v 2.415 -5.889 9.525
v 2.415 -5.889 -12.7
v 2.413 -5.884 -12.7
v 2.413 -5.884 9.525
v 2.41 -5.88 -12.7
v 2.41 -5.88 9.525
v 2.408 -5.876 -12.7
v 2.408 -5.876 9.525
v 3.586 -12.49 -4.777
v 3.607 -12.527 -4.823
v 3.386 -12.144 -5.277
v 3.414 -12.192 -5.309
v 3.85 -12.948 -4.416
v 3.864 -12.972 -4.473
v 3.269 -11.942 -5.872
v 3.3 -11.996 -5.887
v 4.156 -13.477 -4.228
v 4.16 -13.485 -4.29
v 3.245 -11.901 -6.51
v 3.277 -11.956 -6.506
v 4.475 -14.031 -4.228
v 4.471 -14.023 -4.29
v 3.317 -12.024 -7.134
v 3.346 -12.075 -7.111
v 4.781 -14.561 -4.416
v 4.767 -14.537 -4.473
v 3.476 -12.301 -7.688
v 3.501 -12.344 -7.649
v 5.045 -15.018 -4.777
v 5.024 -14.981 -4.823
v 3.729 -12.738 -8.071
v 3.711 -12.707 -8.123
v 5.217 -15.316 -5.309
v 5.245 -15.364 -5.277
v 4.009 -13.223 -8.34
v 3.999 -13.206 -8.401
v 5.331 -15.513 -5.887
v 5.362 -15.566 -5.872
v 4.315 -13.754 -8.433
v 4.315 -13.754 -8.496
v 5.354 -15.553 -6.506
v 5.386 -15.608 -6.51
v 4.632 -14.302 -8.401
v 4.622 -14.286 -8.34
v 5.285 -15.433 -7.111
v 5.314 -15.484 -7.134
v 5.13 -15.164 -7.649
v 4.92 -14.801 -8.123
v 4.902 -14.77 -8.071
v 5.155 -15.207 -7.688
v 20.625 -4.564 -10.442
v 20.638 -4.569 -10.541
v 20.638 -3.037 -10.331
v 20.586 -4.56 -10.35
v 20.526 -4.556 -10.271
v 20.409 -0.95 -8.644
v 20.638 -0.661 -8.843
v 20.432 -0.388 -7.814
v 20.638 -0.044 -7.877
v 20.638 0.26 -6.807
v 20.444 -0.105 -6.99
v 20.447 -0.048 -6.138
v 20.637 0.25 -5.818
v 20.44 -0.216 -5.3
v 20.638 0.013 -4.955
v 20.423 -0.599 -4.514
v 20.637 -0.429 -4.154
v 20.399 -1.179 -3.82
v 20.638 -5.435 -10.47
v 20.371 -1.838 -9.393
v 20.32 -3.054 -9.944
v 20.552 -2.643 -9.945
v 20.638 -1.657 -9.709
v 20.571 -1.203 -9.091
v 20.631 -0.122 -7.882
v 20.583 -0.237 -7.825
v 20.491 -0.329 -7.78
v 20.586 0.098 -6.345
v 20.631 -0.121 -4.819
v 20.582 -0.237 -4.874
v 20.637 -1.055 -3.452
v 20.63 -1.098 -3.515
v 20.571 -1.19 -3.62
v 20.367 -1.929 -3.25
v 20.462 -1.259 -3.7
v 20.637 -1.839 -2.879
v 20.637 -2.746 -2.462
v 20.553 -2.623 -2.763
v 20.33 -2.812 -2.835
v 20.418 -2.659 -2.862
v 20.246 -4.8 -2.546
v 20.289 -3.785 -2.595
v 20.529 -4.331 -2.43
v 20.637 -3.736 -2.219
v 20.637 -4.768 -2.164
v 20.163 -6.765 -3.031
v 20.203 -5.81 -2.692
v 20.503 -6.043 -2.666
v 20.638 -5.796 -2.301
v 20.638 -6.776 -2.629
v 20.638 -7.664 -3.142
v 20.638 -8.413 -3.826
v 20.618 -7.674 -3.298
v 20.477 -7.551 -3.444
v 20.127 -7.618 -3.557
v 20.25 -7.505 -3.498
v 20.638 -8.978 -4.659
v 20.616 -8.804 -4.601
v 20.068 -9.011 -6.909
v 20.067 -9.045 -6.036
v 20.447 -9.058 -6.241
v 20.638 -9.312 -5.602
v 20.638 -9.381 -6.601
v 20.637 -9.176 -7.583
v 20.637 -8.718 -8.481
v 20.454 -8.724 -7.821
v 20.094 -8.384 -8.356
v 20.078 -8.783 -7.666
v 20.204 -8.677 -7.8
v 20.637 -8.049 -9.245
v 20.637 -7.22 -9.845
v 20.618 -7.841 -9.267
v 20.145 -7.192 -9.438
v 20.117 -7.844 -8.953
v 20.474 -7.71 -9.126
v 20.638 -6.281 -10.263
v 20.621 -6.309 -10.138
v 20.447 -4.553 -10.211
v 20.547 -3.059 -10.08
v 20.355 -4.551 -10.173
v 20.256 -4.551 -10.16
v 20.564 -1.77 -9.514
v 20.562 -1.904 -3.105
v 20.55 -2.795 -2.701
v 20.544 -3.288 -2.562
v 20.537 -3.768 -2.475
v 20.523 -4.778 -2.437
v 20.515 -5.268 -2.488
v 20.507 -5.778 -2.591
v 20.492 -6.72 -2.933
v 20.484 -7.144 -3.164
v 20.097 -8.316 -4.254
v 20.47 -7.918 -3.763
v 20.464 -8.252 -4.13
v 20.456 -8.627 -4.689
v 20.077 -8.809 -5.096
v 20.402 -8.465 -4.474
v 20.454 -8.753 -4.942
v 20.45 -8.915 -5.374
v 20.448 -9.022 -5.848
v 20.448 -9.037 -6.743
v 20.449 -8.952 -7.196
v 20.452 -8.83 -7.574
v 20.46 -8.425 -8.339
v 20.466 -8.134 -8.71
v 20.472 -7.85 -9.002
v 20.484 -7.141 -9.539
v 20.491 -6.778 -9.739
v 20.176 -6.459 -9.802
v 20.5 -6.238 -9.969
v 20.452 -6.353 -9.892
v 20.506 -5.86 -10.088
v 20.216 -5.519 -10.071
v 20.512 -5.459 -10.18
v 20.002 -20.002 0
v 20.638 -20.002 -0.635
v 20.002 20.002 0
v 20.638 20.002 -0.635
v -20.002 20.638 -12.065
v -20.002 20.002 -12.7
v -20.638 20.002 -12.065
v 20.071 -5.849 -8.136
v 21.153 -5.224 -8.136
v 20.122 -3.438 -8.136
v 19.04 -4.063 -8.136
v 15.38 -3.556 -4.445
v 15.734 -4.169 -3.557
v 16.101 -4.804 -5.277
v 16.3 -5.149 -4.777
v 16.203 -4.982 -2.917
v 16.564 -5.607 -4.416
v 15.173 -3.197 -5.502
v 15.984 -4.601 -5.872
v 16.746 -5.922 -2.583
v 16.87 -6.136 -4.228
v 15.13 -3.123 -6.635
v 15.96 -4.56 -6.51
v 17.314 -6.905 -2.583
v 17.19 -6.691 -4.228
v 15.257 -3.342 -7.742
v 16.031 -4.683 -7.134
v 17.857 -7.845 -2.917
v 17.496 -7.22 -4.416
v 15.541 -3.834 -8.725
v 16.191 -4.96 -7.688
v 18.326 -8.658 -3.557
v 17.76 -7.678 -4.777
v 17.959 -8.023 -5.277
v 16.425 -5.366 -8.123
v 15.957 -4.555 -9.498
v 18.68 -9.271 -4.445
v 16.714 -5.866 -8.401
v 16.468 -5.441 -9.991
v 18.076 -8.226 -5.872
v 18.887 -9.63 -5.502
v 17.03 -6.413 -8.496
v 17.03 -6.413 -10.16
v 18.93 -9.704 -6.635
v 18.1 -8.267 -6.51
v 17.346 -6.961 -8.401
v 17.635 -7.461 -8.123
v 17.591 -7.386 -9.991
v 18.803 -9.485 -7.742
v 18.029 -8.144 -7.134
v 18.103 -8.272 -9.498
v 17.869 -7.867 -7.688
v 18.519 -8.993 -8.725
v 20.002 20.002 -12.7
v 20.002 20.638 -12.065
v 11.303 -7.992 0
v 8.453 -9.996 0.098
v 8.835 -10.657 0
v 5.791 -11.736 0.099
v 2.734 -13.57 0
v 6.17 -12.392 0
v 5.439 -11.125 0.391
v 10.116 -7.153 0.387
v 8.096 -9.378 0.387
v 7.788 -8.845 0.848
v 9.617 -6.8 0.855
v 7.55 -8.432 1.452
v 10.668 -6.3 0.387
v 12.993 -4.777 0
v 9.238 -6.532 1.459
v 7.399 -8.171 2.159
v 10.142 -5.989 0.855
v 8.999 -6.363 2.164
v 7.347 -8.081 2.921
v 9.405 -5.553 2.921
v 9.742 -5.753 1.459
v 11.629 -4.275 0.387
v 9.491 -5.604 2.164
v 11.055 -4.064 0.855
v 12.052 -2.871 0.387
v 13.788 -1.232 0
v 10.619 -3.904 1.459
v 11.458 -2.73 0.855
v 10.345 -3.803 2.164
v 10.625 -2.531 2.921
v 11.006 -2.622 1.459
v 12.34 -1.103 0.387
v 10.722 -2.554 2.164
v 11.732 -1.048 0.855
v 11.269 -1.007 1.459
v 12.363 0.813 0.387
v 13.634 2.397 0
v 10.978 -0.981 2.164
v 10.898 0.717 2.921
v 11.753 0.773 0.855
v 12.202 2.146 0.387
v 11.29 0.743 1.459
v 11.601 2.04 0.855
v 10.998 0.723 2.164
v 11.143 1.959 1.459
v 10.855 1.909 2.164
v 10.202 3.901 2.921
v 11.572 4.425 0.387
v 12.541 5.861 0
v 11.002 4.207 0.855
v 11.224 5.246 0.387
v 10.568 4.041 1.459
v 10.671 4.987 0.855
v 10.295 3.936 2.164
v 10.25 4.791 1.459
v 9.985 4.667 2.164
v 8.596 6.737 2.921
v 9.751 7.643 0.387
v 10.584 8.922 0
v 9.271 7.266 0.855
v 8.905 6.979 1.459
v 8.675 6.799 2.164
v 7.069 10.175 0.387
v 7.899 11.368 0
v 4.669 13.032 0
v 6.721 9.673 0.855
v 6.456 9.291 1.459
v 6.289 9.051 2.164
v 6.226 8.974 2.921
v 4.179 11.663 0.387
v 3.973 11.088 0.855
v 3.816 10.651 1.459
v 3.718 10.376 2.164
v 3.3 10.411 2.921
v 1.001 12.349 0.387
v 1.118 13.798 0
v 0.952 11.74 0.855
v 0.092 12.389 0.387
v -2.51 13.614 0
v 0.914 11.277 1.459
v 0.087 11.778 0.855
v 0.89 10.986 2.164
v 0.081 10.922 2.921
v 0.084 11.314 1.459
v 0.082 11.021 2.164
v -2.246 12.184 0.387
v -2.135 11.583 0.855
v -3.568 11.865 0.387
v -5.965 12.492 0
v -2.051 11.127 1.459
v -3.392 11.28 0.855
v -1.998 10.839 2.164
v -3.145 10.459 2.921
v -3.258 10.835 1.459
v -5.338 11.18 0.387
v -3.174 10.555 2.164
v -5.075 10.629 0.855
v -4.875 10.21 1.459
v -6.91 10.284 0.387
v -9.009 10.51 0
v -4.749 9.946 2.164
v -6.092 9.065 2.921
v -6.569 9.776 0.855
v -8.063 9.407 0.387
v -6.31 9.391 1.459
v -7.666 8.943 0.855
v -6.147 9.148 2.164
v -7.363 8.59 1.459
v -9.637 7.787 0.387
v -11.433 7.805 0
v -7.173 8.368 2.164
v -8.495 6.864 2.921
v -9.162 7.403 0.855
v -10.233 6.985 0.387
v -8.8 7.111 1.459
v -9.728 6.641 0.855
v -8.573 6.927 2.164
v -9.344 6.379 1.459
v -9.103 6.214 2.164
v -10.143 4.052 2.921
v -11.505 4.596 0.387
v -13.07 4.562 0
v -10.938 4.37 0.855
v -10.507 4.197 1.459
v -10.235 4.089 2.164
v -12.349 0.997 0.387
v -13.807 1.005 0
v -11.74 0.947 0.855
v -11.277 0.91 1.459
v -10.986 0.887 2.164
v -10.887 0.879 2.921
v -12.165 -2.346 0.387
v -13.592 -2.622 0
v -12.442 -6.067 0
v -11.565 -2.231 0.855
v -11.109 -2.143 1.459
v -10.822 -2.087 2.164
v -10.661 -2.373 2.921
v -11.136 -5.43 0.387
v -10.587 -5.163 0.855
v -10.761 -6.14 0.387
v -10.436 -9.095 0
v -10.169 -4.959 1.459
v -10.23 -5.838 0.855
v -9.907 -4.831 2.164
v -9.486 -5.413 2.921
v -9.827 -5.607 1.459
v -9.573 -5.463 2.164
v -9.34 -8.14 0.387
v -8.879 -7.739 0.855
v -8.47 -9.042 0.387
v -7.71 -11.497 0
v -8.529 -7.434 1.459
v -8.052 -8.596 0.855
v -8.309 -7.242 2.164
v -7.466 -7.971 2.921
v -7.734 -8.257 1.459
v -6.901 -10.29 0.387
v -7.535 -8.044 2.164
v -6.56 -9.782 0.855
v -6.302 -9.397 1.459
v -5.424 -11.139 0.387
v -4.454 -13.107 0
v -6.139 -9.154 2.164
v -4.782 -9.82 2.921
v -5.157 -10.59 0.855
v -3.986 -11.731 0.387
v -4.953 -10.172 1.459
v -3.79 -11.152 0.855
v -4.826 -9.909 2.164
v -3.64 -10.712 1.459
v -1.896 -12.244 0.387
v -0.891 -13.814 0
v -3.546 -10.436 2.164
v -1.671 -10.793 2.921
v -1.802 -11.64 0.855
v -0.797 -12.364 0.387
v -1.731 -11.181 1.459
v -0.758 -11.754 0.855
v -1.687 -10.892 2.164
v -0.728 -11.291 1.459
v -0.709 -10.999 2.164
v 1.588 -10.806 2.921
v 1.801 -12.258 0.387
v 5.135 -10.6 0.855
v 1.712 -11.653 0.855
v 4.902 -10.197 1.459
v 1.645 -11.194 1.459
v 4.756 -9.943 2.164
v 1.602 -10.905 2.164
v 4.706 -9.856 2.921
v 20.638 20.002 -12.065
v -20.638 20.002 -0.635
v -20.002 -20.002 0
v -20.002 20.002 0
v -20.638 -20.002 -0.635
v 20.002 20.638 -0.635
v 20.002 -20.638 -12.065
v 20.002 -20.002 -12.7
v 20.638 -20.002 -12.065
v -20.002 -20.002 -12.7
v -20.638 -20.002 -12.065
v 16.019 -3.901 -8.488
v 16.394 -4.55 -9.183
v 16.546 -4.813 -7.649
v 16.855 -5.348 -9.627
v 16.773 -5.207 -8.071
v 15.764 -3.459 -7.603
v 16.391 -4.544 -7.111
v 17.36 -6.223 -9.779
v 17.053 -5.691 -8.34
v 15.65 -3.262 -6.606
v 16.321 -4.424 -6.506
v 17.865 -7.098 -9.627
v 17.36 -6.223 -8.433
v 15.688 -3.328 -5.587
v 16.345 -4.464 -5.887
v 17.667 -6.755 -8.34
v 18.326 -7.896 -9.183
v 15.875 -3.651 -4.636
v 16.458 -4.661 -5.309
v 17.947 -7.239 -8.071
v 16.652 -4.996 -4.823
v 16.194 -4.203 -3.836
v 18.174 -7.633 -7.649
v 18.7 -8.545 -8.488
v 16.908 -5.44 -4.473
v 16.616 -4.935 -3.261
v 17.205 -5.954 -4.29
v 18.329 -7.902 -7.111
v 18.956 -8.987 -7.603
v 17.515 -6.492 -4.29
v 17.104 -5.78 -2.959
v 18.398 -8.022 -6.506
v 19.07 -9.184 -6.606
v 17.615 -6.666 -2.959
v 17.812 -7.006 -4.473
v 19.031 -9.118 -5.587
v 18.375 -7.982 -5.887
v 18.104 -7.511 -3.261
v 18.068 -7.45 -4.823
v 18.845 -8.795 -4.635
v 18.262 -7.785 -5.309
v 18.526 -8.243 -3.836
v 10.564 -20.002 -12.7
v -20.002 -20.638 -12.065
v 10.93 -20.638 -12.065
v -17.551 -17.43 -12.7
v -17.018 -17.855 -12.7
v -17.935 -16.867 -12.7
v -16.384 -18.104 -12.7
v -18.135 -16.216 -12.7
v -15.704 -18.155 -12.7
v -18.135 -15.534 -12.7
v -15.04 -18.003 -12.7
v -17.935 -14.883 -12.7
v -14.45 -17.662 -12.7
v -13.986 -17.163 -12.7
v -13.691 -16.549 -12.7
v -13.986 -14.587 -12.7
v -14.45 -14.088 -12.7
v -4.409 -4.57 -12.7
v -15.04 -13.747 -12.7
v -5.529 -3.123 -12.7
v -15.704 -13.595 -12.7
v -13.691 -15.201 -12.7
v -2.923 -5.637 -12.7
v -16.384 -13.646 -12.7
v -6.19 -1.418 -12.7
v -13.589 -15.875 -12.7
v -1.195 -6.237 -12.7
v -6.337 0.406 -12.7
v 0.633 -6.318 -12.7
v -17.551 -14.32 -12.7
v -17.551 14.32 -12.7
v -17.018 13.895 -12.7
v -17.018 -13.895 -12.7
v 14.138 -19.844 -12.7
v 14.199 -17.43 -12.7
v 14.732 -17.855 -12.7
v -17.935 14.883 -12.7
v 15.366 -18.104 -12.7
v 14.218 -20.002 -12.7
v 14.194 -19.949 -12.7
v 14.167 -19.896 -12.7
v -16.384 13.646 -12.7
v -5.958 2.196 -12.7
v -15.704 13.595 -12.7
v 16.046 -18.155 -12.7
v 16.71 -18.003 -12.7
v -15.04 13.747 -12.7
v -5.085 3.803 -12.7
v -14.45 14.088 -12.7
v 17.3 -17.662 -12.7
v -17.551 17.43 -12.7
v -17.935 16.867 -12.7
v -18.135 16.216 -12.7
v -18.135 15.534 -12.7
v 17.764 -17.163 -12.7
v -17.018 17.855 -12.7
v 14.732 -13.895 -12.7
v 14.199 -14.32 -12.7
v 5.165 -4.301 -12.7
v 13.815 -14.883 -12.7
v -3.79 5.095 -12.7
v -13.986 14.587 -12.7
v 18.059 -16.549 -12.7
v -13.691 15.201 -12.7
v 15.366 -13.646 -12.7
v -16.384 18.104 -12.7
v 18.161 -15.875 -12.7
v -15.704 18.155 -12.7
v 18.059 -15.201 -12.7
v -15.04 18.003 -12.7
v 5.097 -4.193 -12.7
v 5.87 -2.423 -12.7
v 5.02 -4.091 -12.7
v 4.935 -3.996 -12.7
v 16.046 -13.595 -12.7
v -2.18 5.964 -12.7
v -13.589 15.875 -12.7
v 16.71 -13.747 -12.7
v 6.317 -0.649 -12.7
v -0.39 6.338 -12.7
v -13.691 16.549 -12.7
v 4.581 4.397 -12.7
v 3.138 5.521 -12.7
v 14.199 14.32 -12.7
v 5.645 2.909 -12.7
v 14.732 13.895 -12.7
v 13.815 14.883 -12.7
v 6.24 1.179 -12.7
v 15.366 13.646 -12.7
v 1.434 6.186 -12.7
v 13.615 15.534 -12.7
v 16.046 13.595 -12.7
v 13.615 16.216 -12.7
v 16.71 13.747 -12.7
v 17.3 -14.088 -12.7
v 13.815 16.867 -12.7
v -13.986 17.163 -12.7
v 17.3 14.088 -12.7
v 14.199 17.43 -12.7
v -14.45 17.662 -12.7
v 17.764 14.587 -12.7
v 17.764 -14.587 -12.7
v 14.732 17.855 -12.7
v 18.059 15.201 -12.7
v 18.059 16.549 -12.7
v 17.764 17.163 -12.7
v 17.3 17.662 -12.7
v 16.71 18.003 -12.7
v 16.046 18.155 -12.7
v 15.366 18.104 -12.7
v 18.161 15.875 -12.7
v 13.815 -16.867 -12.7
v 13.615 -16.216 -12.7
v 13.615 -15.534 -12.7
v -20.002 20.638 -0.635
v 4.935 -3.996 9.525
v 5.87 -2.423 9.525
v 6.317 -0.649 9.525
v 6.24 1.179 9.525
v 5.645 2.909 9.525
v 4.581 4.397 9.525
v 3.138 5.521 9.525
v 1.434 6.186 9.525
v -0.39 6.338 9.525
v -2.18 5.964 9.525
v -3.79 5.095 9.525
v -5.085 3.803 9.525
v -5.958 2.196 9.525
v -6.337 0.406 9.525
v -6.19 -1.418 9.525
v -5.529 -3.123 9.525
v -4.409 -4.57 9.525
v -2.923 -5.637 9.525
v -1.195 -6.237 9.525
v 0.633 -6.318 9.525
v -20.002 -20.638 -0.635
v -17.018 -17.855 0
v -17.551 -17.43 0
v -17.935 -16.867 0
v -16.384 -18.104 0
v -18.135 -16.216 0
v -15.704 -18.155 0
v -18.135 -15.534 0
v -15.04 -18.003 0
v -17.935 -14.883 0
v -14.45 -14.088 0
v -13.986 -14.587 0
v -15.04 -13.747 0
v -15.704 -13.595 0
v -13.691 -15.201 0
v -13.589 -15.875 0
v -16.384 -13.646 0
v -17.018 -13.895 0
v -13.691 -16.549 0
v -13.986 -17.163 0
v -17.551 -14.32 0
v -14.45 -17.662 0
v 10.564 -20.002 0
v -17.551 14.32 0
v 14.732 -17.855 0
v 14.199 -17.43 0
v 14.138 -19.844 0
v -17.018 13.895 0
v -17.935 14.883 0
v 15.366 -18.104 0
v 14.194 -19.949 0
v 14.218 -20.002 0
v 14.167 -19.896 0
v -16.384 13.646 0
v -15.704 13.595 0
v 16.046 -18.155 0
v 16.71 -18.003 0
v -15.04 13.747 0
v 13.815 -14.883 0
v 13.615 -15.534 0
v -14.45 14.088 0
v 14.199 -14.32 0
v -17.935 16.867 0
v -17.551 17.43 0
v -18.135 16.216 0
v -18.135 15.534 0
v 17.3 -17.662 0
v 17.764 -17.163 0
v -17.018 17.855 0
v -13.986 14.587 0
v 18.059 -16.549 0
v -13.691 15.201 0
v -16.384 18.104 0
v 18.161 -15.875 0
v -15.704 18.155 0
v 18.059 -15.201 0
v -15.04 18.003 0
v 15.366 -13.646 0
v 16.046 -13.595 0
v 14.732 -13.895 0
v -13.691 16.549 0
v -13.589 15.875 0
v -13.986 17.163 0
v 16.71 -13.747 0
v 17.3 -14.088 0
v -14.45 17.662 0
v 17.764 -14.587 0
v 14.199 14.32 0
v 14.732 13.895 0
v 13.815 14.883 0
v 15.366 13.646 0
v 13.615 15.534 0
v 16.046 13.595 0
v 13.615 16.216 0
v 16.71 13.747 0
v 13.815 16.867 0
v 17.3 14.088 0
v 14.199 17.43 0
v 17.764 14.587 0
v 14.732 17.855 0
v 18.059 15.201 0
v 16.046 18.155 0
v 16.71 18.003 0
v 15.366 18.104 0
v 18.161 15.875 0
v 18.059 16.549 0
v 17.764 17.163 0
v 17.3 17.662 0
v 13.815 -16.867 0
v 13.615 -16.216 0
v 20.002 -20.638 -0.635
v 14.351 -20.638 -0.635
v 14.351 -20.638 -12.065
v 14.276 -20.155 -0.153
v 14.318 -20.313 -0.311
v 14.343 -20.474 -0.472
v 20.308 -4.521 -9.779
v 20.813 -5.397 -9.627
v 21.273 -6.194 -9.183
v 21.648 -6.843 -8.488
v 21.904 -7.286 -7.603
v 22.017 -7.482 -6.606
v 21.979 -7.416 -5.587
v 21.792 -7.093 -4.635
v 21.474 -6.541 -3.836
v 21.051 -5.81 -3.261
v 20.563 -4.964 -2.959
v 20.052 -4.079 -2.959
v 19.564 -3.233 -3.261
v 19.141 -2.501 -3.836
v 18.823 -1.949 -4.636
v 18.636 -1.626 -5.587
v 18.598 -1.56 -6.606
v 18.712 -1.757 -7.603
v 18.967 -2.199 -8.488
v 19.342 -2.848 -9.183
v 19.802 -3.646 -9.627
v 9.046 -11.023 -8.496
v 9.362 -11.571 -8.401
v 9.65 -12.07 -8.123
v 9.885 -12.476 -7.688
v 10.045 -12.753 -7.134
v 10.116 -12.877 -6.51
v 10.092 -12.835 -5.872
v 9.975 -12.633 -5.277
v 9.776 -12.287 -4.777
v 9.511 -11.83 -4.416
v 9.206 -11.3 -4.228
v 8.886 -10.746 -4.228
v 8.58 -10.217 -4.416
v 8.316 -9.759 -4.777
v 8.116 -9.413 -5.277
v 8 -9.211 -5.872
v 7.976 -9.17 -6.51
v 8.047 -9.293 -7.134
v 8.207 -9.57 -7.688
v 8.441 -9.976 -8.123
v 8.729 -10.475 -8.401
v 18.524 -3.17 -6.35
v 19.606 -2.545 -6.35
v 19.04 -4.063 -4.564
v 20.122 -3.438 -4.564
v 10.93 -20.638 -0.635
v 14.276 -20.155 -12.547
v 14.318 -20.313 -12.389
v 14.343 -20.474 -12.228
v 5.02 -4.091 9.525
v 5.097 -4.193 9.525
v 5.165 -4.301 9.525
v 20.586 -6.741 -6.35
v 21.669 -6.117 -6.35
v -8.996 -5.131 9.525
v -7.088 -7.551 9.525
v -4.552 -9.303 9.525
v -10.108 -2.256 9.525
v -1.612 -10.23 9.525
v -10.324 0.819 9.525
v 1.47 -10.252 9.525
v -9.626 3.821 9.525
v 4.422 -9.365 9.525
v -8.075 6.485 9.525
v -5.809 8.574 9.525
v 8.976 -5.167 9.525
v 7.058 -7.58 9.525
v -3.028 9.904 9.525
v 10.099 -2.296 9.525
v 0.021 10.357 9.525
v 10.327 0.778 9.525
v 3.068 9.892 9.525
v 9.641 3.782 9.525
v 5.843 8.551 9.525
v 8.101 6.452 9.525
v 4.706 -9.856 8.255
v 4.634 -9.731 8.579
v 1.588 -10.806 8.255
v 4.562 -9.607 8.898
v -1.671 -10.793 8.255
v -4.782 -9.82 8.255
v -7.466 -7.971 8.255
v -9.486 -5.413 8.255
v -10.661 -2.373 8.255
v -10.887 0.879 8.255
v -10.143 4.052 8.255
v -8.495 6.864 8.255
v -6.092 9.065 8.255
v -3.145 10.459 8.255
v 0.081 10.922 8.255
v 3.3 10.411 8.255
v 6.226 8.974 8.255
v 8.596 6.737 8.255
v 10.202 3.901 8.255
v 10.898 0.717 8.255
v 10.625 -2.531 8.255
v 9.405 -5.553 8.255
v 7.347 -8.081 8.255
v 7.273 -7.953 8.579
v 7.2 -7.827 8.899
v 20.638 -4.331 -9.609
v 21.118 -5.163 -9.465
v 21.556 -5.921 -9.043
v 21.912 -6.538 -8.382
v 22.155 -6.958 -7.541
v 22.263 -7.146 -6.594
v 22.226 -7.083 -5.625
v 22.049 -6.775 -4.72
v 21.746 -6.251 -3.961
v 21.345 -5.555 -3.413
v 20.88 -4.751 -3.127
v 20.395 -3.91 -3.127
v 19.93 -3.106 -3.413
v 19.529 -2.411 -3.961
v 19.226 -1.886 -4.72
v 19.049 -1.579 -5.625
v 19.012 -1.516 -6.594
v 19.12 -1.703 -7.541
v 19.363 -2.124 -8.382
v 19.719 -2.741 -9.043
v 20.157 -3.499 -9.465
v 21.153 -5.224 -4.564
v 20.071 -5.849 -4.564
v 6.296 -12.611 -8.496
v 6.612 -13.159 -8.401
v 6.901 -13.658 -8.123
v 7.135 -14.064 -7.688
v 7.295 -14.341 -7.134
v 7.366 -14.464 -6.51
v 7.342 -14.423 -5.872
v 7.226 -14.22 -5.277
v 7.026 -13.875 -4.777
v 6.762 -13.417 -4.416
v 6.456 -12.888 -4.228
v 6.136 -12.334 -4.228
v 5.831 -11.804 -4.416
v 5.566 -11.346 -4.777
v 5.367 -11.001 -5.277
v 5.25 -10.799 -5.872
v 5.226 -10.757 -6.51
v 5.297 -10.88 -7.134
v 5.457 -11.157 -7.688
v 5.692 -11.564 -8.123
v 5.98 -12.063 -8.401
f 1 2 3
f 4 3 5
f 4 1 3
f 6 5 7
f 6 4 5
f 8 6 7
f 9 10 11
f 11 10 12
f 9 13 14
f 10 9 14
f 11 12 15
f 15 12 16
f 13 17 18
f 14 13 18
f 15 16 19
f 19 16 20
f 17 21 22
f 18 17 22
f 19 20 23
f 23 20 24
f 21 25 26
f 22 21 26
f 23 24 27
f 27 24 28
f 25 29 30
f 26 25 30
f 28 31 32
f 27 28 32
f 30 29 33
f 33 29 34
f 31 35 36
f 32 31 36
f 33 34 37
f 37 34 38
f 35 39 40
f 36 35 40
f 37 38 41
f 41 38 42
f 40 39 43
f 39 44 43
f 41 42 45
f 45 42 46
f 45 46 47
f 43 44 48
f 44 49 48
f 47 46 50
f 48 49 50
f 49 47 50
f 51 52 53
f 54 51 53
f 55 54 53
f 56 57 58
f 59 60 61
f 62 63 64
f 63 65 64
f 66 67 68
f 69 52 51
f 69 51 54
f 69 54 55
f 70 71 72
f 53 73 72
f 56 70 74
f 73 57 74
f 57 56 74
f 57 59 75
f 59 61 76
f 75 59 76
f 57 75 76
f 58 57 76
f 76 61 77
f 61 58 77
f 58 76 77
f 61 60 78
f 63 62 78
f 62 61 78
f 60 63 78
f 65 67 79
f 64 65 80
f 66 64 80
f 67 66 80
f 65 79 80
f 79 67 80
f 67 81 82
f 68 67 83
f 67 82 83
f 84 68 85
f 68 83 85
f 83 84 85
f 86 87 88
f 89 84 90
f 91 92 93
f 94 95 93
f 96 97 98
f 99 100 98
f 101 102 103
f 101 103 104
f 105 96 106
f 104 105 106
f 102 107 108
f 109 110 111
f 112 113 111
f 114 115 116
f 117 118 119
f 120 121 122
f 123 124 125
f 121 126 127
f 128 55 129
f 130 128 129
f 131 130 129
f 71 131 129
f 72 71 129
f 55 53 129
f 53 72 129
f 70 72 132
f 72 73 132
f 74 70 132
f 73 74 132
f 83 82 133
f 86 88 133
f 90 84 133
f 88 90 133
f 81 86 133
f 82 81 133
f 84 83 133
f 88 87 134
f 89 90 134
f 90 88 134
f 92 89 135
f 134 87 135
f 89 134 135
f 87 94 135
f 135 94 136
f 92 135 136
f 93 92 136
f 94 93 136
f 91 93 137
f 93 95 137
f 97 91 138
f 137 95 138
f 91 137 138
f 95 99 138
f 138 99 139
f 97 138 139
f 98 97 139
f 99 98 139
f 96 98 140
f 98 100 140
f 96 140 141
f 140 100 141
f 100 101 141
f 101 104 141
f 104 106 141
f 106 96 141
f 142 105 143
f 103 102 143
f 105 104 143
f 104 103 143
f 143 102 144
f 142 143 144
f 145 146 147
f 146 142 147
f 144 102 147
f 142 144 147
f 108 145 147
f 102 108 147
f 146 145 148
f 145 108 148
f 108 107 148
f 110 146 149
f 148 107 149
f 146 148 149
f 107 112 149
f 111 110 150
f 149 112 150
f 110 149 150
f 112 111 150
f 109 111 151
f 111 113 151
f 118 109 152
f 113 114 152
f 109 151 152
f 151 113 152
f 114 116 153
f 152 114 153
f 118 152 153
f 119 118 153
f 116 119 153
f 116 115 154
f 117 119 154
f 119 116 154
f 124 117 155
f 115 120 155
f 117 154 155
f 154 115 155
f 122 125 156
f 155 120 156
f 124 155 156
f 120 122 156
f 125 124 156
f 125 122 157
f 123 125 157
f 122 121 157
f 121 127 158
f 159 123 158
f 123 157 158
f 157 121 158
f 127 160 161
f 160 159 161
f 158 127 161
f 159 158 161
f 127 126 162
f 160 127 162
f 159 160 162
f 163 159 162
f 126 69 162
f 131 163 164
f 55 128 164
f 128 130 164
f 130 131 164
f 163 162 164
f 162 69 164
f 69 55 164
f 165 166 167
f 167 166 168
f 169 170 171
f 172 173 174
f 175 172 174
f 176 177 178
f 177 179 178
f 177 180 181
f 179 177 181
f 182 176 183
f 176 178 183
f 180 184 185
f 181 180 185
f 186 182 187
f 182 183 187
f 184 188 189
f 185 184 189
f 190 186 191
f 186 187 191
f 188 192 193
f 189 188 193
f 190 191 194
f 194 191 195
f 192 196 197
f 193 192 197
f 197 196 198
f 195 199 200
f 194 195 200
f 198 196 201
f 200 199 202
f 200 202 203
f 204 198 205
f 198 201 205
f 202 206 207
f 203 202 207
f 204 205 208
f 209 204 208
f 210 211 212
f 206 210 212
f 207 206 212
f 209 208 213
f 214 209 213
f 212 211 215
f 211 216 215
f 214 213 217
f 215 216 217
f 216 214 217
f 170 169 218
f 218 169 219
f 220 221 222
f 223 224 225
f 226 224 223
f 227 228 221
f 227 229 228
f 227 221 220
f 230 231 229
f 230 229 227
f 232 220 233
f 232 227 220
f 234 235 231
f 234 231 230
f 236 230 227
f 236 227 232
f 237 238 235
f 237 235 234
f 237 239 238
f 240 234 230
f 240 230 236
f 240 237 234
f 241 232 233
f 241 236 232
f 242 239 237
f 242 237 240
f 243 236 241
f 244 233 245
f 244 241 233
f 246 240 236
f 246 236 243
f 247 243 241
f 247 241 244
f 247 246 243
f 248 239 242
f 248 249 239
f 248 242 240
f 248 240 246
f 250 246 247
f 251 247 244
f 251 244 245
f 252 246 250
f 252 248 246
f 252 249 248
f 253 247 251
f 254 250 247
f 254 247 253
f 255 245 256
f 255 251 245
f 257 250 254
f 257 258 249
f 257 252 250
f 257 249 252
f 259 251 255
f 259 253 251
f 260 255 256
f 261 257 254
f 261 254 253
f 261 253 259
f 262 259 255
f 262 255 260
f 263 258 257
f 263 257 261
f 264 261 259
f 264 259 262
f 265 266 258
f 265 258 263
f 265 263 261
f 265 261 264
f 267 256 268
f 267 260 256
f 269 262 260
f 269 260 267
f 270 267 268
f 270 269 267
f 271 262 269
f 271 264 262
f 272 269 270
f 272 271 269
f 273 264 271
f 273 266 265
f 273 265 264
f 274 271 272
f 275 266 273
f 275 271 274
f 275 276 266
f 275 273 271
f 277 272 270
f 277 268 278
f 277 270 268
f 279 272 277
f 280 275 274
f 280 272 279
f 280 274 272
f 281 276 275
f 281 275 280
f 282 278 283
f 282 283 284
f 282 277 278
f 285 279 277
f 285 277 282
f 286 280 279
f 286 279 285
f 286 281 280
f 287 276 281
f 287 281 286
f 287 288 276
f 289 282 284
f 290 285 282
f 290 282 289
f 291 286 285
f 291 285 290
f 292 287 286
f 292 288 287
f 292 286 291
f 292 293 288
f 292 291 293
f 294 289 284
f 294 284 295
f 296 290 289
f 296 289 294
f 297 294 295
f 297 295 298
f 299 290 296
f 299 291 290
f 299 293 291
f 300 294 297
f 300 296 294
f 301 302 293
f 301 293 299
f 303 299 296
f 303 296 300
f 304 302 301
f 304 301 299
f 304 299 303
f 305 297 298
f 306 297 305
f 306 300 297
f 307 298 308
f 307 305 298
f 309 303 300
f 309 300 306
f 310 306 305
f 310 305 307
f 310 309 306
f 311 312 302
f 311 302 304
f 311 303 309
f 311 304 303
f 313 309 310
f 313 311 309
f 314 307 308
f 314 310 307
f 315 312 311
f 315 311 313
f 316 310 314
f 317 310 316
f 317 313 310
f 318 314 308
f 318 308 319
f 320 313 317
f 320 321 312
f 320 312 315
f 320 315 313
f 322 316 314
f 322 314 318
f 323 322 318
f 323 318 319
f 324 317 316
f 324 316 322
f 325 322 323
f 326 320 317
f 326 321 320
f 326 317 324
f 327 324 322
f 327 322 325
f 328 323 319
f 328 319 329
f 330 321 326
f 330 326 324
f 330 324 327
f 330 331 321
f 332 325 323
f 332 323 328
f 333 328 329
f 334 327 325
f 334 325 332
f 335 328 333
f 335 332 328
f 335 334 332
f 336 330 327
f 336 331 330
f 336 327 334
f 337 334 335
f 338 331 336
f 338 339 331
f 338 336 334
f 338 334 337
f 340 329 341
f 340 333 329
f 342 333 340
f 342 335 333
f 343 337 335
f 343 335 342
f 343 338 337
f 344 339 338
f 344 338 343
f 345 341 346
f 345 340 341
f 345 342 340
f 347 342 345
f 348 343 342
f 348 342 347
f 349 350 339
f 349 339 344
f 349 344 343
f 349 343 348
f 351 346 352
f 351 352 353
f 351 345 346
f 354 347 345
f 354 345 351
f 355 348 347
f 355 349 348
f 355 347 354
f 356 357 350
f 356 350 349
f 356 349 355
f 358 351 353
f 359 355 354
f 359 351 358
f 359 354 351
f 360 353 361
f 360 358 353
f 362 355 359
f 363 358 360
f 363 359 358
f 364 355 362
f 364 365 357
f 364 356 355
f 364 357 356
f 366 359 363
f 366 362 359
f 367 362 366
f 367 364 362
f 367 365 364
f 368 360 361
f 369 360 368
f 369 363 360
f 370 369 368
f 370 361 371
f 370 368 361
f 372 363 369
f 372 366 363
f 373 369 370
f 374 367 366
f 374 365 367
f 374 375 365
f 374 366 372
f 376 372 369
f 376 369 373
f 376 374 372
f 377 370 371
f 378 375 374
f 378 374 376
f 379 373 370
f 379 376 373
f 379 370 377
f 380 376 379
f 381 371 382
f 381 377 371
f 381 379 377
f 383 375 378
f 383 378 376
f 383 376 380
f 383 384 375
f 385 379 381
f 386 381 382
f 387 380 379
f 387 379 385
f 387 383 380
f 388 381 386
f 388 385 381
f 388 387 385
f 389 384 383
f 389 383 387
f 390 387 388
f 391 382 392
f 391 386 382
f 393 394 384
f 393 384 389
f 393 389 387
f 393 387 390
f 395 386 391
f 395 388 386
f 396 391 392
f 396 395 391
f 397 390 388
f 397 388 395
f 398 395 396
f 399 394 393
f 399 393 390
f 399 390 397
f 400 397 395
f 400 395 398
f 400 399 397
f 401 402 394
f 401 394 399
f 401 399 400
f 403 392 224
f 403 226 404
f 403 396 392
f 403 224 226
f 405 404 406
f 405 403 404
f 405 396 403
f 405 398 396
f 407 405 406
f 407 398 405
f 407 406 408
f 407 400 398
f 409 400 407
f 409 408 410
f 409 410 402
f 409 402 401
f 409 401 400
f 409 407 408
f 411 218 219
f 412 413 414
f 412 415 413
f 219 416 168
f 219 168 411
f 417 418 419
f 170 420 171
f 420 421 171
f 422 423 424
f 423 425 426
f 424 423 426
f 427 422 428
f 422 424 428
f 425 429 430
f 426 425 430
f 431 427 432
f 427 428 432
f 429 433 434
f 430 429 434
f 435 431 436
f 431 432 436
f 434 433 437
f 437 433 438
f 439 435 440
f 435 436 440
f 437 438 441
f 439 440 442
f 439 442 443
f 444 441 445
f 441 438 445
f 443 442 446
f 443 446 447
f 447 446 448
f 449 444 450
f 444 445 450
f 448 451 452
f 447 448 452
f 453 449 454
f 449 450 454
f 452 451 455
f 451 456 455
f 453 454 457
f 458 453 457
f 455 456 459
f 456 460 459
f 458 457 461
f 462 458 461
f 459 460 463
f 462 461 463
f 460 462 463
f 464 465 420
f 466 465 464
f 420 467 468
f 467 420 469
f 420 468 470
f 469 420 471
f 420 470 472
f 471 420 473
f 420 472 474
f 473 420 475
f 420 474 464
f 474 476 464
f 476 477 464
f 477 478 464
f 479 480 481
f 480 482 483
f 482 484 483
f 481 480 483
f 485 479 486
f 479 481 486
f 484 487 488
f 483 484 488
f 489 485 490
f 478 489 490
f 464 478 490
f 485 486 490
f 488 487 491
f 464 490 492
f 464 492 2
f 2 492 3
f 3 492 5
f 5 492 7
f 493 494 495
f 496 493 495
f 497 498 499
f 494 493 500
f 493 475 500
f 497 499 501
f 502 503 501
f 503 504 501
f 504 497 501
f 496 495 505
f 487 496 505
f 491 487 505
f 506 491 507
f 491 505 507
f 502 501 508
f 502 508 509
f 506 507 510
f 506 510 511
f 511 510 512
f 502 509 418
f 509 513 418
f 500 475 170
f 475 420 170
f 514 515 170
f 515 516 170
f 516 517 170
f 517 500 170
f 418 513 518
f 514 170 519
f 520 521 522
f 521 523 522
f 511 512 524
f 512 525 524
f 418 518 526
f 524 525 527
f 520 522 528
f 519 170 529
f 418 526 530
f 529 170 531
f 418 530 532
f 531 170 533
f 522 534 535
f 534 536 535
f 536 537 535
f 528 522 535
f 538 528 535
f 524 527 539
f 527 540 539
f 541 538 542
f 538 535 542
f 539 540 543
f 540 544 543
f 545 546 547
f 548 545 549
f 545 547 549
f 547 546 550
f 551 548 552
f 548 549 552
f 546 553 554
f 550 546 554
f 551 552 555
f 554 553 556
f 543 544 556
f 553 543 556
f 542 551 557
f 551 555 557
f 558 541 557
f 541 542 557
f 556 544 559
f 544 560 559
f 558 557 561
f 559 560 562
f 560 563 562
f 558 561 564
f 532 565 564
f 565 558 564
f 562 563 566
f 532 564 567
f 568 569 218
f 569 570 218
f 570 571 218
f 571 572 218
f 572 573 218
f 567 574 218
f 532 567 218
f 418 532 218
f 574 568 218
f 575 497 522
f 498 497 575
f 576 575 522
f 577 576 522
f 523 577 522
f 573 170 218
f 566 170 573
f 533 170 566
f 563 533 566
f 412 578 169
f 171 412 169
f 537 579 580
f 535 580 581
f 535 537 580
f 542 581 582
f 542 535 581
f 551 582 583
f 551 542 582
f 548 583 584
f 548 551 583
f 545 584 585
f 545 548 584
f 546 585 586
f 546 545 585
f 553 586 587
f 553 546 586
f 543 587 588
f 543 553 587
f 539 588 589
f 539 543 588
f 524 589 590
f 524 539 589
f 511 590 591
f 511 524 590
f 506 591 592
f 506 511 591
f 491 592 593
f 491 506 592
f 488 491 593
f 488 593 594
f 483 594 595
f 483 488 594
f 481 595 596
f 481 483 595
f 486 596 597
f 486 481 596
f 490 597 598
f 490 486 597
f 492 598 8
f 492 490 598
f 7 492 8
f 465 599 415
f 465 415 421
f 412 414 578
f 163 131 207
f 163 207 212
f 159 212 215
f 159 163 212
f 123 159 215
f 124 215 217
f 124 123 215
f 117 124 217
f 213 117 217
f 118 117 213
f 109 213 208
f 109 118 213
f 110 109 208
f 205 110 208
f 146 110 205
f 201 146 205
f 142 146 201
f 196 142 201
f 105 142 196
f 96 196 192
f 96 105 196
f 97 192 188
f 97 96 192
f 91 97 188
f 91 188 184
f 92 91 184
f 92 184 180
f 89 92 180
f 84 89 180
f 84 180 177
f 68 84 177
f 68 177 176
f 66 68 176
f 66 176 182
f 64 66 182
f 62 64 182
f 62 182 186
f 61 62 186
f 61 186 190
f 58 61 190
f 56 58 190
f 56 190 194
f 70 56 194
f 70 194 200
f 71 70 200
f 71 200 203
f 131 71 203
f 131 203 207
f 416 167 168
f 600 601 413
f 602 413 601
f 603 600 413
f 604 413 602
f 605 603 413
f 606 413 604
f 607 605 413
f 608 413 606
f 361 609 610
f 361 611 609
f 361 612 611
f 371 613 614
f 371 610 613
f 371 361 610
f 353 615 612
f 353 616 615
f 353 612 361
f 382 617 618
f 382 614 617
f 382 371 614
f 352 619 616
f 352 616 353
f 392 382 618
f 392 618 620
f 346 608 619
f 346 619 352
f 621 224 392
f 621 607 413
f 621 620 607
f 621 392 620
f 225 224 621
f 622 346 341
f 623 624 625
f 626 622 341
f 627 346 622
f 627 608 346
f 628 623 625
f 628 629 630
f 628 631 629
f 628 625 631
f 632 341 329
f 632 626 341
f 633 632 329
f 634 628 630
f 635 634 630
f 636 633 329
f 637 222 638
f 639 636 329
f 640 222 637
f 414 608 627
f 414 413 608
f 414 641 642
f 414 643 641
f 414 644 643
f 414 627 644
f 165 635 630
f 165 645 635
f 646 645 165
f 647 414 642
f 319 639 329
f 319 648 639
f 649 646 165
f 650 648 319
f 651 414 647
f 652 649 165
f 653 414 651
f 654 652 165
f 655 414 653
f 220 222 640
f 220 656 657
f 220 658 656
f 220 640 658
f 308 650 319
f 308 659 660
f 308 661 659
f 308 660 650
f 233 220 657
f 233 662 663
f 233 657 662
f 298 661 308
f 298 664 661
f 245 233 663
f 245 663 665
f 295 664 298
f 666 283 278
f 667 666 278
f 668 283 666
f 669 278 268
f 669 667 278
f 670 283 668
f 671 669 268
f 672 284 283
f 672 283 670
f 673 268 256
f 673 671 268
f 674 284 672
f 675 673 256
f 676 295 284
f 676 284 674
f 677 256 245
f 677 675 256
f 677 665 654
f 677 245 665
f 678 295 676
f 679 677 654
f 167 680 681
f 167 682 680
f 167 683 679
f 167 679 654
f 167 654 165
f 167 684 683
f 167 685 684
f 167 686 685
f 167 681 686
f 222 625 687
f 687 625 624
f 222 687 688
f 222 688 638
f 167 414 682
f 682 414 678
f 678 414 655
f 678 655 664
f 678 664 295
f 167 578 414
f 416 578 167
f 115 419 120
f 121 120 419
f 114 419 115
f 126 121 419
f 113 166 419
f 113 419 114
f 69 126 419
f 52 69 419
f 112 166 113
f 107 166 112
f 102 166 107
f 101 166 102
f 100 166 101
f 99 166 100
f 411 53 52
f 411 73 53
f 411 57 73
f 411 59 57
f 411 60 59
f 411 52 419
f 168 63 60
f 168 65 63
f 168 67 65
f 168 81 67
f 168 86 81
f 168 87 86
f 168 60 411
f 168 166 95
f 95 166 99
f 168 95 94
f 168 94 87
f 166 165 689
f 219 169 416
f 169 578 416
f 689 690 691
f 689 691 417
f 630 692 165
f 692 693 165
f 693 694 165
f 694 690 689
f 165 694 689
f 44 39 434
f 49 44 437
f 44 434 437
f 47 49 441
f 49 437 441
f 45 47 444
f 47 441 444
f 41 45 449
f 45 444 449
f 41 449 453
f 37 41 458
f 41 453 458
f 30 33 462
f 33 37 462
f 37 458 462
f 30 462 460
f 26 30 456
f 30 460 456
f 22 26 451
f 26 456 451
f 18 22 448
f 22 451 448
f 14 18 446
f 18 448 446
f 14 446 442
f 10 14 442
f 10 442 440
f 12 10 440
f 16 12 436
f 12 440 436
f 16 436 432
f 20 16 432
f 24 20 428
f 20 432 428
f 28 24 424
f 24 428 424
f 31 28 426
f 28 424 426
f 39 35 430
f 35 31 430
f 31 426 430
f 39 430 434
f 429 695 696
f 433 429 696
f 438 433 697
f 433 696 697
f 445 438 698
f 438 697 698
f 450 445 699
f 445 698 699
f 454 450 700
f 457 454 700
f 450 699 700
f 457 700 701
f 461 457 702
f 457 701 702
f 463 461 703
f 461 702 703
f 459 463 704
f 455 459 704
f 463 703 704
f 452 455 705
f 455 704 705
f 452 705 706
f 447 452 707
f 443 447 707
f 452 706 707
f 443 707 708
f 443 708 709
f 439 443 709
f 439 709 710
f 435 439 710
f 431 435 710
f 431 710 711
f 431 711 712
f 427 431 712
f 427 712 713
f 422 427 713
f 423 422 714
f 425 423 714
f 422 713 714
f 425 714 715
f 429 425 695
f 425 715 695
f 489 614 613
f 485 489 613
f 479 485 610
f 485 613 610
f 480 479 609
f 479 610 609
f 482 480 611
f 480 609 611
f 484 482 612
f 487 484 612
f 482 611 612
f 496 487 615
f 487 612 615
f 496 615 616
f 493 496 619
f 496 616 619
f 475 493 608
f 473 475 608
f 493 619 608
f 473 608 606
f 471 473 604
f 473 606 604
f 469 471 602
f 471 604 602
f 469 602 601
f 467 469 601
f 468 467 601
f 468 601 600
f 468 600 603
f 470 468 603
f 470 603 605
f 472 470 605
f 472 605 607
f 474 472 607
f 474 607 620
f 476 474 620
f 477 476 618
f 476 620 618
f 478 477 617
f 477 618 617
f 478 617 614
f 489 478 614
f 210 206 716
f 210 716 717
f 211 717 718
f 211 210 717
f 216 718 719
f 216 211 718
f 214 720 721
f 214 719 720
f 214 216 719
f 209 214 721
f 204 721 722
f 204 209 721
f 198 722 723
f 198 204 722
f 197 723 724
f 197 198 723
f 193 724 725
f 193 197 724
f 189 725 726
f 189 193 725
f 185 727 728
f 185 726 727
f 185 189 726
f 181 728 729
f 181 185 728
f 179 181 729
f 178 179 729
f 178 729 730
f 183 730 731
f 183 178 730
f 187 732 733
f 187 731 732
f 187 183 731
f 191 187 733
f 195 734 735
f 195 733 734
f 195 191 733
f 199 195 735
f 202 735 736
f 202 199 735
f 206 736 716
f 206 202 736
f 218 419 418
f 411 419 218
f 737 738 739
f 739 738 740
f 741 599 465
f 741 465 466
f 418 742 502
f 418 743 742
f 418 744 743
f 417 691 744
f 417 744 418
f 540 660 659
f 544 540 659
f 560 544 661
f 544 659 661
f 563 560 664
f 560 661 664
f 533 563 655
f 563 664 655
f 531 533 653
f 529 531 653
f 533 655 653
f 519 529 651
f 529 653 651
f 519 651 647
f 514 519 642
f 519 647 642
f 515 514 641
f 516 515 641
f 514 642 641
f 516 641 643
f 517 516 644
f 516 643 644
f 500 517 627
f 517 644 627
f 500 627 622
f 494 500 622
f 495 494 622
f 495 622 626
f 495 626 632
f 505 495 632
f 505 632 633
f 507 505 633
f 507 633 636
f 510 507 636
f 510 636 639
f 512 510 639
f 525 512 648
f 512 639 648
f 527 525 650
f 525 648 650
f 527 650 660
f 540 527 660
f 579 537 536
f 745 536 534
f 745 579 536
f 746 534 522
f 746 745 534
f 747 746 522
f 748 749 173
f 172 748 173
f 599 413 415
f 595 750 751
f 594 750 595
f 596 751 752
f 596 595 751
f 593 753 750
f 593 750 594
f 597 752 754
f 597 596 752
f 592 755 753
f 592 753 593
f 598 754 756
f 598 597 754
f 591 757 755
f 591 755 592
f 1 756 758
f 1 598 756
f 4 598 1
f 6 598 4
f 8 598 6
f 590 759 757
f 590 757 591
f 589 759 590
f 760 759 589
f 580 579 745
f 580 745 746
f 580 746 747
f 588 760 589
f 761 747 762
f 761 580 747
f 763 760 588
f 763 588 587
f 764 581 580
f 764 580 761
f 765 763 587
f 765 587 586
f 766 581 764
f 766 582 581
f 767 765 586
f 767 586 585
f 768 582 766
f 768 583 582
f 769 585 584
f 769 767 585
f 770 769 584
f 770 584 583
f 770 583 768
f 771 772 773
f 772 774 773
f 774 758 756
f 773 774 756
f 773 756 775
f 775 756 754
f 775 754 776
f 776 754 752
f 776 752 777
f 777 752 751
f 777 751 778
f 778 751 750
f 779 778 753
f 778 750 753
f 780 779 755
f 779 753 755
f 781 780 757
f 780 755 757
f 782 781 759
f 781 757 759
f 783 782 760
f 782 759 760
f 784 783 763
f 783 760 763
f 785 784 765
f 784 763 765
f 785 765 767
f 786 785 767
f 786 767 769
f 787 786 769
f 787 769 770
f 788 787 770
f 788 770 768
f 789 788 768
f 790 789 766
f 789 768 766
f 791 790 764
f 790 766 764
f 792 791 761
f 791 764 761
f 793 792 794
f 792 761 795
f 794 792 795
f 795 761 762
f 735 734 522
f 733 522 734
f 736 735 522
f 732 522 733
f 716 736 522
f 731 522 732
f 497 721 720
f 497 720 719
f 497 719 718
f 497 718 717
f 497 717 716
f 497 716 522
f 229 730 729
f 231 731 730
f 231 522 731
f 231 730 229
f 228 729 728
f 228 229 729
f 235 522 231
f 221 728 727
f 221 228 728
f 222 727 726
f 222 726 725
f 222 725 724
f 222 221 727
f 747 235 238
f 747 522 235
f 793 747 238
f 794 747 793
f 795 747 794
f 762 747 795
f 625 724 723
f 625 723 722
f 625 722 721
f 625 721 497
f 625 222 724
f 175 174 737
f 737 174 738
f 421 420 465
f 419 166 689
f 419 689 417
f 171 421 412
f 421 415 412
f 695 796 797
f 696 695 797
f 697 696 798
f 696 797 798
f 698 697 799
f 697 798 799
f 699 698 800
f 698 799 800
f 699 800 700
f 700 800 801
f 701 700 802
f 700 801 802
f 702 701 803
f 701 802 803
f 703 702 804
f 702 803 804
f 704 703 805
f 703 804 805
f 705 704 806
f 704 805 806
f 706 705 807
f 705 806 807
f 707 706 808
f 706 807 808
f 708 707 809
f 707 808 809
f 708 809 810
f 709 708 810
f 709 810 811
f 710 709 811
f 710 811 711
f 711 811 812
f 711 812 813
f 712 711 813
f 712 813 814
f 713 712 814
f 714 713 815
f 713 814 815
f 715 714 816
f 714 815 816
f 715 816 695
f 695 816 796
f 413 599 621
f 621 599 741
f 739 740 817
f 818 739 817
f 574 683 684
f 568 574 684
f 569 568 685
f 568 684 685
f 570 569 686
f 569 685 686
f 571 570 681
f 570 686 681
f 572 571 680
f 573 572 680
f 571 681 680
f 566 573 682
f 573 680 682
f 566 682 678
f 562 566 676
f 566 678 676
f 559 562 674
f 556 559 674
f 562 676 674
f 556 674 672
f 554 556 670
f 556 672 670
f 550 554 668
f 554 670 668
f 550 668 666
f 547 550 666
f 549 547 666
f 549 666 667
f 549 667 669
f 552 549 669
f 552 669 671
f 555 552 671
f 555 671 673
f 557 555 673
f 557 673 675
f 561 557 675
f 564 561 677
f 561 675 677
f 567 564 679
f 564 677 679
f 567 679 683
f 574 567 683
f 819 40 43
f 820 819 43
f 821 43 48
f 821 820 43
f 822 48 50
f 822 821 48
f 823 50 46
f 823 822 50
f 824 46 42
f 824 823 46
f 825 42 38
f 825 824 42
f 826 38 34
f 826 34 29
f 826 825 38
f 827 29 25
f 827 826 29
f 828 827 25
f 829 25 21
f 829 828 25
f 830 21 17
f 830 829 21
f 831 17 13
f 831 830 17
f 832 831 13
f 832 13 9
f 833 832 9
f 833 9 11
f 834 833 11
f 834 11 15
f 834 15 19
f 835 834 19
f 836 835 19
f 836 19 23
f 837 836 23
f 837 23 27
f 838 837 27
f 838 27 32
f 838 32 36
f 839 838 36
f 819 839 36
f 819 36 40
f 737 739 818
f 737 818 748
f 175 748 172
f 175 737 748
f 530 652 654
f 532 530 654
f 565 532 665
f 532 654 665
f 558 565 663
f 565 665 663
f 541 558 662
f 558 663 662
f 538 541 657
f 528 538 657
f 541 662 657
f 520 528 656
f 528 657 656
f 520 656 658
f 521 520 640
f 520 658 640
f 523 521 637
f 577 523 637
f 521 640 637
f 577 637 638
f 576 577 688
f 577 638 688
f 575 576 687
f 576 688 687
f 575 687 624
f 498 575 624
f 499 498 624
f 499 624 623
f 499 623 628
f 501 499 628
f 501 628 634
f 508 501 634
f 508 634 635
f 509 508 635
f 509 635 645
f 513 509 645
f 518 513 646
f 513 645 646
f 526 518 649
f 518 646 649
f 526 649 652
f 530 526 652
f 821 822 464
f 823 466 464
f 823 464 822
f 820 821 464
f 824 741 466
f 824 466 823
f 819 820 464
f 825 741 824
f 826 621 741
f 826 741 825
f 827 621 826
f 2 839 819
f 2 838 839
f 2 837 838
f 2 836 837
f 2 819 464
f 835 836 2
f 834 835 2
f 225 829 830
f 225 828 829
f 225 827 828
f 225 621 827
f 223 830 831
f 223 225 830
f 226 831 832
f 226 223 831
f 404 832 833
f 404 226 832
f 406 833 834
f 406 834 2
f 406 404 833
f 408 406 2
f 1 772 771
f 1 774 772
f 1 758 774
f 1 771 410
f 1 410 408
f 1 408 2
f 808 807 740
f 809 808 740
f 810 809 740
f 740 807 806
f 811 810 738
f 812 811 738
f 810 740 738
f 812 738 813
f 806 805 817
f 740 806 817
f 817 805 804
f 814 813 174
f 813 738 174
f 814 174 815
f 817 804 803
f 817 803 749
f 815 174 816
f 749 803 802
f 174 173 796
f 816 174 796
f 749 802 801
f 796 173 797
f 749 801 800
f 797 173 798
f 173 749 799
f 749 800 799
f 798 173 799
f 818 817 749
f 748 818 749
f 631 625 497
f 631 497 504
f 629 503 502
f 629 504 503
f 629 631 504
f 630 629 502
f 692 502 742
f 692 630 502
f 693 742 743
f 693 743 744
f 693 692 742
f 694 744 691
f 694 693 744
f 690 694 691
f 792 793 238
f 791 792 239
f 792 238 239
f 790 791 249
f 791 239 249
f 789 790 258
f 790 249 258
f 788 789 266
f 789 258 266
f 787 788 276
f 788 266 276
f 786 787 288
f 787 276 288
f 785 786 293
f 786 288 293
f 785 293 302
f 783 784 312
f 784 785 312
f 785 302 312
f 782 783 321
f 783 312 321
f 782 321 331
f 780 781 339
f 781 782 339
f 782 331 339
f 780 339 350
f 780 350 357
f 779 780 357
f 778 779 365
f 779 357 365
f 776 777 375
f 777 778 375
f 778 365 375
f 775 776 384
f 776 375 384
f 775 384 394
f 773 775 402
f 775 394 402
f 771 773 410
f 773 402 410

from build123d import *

# Parameters (mm, degrees)
SKETCH4_W               = 41.275
SKETCH4_H               = 41.275
SKETCH4_R               = 2.286
SKETCH4_R_2             = 6.35
BOSS_EXTRUDE1_DEPTH     = 12.7
SKETCH6_R               = 10.922
SKETCH6_R_2             = 6.35
BOSS_EXTRUDE2_DEPTH     = 9.525
CUT_EXTRUDE1_DEPTH      = 23.225
CHAMFER1_SIZE           = 1.27
CHAMFER1_SIZE2          = 0.56544043
CHAMFER3_SIZE           = 0.635
SKETCH18_R              = 2.1463
CUT_EXTRUDE2_DEPTH      = 18.847032
CUT_EXTRUDE2_DEPTH_BACK = 2.54
SKETCH19_R              = 3.81
CUT_EXTRUDE3_DEPTH      = 4.1656
CUT_EXTRUDE3_DEPTH_BACK = 13.484099492
CUT_EXTRUDE4_DEPTH      = 1.24968
CHAMFER4_SIZE           = 0.381
CHAMFER4_SIZE2          = 0.169632129
FILLET1_R               = 0.381
FILLET2_R               = 2.921


with BuildPart() as part:
    # Sketch4 → Boss-Extrude1 (new body)
    with BuildSketch(Plane.XY):
        Rectangle(SKETCH4_W, SKETCH4_H)
        with Locations((-15.875, -15.875)):
            Circle(SKETCH4_R, mode=Mode.SUBTRACT)
        with Locations((15.875, -15.875)):
            Circle(SKETCH4_R, mode=Mode.SUBTRACT)
        with Locations((15.875, 15.875)):
            Circle(SKETCH4_R, mode=Mode.SUBTRACT)
        with Locations((-15.875, 15.875)):
            Circle(SKETCH4_R, mode=Mode.SUBTRACT)
        Circle(SKETCH4_R_2, mode=Mode.SUBTRACT)
    extrude(amount=-BOSS_EXTRUDE1_DEPTH)

    # Sketch6 → Boss-Extrude2 (add)
    with BuildSketch(Plane.XY):
        Circle(SKETCH6_R)
        Circle(SKETCH6_R_2, mode=Mode.SUBTRACT)
    extrude(amount=BOSS_EXTRUDE2_DEPTH)

    # Sketch8 → Cut-Extrude1 (cut, through all)
    with BuildSketch(Plane.XY.offset(9.525)):
        with BuildLine():
            Line((11.388684671, -21.43125), (2.415183293, -5.88868969))
            ThreePointArc((2.415183293, -5.88868969), (2.996248621, -3.720124362), (5.16481395, -4.30118969))
            Line((5.16481395, -4.30118969), (14.138315329, -19.84375))
            ThreePointArc((14.138315329, -19.84375), (13.55725, -22.012315329), (11.388684671, -21.43125))
        make_face()
    extrude(amount=-CUT_EXTRUDE1_DEPTH, mode=Mode.SUBTRACT)

    # Chamfer1
    chamfer1_edges = [part.edges().sort_by_distance(p)[0] for p in [
        (-6.09154739, 9.065491404, 9.525),
    ]]
    chamfer1_side = [part.faces().sort_by_distance(p)[0] for p in [
        (-6.09154739, 9.065491404, 4.7625),
    ]]
    chamfer(chamfer1_edges, length=CHAMFER1_SIZE, length2=CHAMFER1_SIZE2, reference=chamfer1_side[0])

    # Chamfer3
    chamfer3_edges = [part.edges().sort_by_distance(p)[0] for p in [
        (0, 20.6375, -12.7),
        (-20.6375, 0, -12.7),
        (-4.853543552, -20.6375, -12.7),
        (-20.6375, 0, 0),
        (17.49425, -20.6375, -12.7),
        (0, 20.6375, 0),
        (17.49425, -20.6375, 0),
        (20.6375, 0, 0),
        (-4.853543552, -20.6375, 0),
        (20.6375, 0, -12.7),
        (-20.6375, -20.6375, -6.35),
        (-20.6375, 20.6375, -6.35),
        (20.6375, 20.6375, -6.35),
        (20.6375, -20.6375, -6.35),
    ]]
    chamfer(chamfer3_edges, length=CHAMFER3_SIZE)

    # Sketch18 → Cut-Extrude2 (cut, two sides)
    with BuildSketch(Plane(origin=(13.602877332, 7.853624889, 0), x_dir=(0, 0, -1), z_dir=(-0.866025404, -0.5, 0))) as cut_extrude2_sk:
        with Locations((6.35, 14.069245336)):
            Circle(SKETCH18_R)
    extrude(amount=CUT_EXTRUDE2_DEPTH, mode=Mode.SUBTRACT)
    extrude(cut_extrude2_sk.sketch, amount=-CUT_EXTRUDE2_DEPTH_BACK, mode=Mode.SUBTRACT)

    # Sketch19 → Cut-Extrude3 (cut, two sides)
    with BuildSketch(Plane(origin=(13.602877332, 7.853624889, 0), x_dir=(0, 0, -1), z_dir=(-0.866025404, -0.5, 0))) as cut_extrude3_sk:
        with Locations((6.35, 14.069245336)):
            Circle(SKETCH19_R)
    extrude(amount=CUT_EXTRUDE3_DEPTH, mode=Mode.SUBTRACT)
    extrude(cut_extrude3_sk.sketch, amount=-CUT_EXTRUDE3_DEPTH_BACK, mode=Mode.SUBTRACT)

    # Sketch21 → Revolve2 (revolve)
    with BuildSketch(Plane(origin=(7.034622668, -12.184323873, 0), x_dir=(-0.866025404, -0.5, 0), z_dir=(0.5, -0.866025404, 0))):
        Polygon((-15.707249779, 6.35), (7.878464507, 6.35), (7.878464507, 8.4328), (-11.922649779, 8.4328), (-11.922649779, 9.779), (-15.707249779, 9.779), align=None)
    revolve(axis=Axis((20.6375, -4.330698984, -6.35), (-0.866025404, -0.5, 0)))

    # Sketch22 → Cut-Extrude4 (cut)
    with BuildSketch(Plane(origin=(13.602877332, 7.853624889, 0), x_dir=(0, 0, -1), z_dir=(0.866025404, 0.5, 0))):
        Polygon((6.35, -16.131468329), (8.1359375, -15.100356833), (8.1359375, -13.03813384), (6.35, -12.007022344), (4.5640625, -13.03813384), (4.5640625, -15.100356833), align=None)
    extrude(amount=-CUT_EXTRUDE4_DEPTH, mode=Mode.SUBTRACT)

    # Chamfer4
    chamfer4_edges = [part.edges().sort_by_distance(p)[0] for p in [
        (20.6375, -4.330698984, -2.921),
    ]]
    chamfer4_side = [part.faces().sort_by_distance(p)[0] for p in [
        (18.998720128, -5.276848984, -2.921),
    ]]
    chamfer(chamfer4_edges, length=CHAMFER4_SIZE, length2=CHAMFER4_SIZE2, reference=chamfer4_side[0])

    # Fillet1
    fillet1_edges = [part.edges().sort_by_distance(p)[0] for p in [
        (20.6375, -8.730108035, -6.35000004),
        (20.6375, 0.068710067, -6.34999996),
    ]]
    fillet(fillet1_edges, radius=FILLET1_R)

    # Fillet2
    fillet2_edges = [part.edges().sort_by_distance(p)[0] for p in [
        (-6.09154739, 9.065491404, 0),
    ]]
    fillet(fillet2_edges, radius=FILLET2_R)


solid = part.part
